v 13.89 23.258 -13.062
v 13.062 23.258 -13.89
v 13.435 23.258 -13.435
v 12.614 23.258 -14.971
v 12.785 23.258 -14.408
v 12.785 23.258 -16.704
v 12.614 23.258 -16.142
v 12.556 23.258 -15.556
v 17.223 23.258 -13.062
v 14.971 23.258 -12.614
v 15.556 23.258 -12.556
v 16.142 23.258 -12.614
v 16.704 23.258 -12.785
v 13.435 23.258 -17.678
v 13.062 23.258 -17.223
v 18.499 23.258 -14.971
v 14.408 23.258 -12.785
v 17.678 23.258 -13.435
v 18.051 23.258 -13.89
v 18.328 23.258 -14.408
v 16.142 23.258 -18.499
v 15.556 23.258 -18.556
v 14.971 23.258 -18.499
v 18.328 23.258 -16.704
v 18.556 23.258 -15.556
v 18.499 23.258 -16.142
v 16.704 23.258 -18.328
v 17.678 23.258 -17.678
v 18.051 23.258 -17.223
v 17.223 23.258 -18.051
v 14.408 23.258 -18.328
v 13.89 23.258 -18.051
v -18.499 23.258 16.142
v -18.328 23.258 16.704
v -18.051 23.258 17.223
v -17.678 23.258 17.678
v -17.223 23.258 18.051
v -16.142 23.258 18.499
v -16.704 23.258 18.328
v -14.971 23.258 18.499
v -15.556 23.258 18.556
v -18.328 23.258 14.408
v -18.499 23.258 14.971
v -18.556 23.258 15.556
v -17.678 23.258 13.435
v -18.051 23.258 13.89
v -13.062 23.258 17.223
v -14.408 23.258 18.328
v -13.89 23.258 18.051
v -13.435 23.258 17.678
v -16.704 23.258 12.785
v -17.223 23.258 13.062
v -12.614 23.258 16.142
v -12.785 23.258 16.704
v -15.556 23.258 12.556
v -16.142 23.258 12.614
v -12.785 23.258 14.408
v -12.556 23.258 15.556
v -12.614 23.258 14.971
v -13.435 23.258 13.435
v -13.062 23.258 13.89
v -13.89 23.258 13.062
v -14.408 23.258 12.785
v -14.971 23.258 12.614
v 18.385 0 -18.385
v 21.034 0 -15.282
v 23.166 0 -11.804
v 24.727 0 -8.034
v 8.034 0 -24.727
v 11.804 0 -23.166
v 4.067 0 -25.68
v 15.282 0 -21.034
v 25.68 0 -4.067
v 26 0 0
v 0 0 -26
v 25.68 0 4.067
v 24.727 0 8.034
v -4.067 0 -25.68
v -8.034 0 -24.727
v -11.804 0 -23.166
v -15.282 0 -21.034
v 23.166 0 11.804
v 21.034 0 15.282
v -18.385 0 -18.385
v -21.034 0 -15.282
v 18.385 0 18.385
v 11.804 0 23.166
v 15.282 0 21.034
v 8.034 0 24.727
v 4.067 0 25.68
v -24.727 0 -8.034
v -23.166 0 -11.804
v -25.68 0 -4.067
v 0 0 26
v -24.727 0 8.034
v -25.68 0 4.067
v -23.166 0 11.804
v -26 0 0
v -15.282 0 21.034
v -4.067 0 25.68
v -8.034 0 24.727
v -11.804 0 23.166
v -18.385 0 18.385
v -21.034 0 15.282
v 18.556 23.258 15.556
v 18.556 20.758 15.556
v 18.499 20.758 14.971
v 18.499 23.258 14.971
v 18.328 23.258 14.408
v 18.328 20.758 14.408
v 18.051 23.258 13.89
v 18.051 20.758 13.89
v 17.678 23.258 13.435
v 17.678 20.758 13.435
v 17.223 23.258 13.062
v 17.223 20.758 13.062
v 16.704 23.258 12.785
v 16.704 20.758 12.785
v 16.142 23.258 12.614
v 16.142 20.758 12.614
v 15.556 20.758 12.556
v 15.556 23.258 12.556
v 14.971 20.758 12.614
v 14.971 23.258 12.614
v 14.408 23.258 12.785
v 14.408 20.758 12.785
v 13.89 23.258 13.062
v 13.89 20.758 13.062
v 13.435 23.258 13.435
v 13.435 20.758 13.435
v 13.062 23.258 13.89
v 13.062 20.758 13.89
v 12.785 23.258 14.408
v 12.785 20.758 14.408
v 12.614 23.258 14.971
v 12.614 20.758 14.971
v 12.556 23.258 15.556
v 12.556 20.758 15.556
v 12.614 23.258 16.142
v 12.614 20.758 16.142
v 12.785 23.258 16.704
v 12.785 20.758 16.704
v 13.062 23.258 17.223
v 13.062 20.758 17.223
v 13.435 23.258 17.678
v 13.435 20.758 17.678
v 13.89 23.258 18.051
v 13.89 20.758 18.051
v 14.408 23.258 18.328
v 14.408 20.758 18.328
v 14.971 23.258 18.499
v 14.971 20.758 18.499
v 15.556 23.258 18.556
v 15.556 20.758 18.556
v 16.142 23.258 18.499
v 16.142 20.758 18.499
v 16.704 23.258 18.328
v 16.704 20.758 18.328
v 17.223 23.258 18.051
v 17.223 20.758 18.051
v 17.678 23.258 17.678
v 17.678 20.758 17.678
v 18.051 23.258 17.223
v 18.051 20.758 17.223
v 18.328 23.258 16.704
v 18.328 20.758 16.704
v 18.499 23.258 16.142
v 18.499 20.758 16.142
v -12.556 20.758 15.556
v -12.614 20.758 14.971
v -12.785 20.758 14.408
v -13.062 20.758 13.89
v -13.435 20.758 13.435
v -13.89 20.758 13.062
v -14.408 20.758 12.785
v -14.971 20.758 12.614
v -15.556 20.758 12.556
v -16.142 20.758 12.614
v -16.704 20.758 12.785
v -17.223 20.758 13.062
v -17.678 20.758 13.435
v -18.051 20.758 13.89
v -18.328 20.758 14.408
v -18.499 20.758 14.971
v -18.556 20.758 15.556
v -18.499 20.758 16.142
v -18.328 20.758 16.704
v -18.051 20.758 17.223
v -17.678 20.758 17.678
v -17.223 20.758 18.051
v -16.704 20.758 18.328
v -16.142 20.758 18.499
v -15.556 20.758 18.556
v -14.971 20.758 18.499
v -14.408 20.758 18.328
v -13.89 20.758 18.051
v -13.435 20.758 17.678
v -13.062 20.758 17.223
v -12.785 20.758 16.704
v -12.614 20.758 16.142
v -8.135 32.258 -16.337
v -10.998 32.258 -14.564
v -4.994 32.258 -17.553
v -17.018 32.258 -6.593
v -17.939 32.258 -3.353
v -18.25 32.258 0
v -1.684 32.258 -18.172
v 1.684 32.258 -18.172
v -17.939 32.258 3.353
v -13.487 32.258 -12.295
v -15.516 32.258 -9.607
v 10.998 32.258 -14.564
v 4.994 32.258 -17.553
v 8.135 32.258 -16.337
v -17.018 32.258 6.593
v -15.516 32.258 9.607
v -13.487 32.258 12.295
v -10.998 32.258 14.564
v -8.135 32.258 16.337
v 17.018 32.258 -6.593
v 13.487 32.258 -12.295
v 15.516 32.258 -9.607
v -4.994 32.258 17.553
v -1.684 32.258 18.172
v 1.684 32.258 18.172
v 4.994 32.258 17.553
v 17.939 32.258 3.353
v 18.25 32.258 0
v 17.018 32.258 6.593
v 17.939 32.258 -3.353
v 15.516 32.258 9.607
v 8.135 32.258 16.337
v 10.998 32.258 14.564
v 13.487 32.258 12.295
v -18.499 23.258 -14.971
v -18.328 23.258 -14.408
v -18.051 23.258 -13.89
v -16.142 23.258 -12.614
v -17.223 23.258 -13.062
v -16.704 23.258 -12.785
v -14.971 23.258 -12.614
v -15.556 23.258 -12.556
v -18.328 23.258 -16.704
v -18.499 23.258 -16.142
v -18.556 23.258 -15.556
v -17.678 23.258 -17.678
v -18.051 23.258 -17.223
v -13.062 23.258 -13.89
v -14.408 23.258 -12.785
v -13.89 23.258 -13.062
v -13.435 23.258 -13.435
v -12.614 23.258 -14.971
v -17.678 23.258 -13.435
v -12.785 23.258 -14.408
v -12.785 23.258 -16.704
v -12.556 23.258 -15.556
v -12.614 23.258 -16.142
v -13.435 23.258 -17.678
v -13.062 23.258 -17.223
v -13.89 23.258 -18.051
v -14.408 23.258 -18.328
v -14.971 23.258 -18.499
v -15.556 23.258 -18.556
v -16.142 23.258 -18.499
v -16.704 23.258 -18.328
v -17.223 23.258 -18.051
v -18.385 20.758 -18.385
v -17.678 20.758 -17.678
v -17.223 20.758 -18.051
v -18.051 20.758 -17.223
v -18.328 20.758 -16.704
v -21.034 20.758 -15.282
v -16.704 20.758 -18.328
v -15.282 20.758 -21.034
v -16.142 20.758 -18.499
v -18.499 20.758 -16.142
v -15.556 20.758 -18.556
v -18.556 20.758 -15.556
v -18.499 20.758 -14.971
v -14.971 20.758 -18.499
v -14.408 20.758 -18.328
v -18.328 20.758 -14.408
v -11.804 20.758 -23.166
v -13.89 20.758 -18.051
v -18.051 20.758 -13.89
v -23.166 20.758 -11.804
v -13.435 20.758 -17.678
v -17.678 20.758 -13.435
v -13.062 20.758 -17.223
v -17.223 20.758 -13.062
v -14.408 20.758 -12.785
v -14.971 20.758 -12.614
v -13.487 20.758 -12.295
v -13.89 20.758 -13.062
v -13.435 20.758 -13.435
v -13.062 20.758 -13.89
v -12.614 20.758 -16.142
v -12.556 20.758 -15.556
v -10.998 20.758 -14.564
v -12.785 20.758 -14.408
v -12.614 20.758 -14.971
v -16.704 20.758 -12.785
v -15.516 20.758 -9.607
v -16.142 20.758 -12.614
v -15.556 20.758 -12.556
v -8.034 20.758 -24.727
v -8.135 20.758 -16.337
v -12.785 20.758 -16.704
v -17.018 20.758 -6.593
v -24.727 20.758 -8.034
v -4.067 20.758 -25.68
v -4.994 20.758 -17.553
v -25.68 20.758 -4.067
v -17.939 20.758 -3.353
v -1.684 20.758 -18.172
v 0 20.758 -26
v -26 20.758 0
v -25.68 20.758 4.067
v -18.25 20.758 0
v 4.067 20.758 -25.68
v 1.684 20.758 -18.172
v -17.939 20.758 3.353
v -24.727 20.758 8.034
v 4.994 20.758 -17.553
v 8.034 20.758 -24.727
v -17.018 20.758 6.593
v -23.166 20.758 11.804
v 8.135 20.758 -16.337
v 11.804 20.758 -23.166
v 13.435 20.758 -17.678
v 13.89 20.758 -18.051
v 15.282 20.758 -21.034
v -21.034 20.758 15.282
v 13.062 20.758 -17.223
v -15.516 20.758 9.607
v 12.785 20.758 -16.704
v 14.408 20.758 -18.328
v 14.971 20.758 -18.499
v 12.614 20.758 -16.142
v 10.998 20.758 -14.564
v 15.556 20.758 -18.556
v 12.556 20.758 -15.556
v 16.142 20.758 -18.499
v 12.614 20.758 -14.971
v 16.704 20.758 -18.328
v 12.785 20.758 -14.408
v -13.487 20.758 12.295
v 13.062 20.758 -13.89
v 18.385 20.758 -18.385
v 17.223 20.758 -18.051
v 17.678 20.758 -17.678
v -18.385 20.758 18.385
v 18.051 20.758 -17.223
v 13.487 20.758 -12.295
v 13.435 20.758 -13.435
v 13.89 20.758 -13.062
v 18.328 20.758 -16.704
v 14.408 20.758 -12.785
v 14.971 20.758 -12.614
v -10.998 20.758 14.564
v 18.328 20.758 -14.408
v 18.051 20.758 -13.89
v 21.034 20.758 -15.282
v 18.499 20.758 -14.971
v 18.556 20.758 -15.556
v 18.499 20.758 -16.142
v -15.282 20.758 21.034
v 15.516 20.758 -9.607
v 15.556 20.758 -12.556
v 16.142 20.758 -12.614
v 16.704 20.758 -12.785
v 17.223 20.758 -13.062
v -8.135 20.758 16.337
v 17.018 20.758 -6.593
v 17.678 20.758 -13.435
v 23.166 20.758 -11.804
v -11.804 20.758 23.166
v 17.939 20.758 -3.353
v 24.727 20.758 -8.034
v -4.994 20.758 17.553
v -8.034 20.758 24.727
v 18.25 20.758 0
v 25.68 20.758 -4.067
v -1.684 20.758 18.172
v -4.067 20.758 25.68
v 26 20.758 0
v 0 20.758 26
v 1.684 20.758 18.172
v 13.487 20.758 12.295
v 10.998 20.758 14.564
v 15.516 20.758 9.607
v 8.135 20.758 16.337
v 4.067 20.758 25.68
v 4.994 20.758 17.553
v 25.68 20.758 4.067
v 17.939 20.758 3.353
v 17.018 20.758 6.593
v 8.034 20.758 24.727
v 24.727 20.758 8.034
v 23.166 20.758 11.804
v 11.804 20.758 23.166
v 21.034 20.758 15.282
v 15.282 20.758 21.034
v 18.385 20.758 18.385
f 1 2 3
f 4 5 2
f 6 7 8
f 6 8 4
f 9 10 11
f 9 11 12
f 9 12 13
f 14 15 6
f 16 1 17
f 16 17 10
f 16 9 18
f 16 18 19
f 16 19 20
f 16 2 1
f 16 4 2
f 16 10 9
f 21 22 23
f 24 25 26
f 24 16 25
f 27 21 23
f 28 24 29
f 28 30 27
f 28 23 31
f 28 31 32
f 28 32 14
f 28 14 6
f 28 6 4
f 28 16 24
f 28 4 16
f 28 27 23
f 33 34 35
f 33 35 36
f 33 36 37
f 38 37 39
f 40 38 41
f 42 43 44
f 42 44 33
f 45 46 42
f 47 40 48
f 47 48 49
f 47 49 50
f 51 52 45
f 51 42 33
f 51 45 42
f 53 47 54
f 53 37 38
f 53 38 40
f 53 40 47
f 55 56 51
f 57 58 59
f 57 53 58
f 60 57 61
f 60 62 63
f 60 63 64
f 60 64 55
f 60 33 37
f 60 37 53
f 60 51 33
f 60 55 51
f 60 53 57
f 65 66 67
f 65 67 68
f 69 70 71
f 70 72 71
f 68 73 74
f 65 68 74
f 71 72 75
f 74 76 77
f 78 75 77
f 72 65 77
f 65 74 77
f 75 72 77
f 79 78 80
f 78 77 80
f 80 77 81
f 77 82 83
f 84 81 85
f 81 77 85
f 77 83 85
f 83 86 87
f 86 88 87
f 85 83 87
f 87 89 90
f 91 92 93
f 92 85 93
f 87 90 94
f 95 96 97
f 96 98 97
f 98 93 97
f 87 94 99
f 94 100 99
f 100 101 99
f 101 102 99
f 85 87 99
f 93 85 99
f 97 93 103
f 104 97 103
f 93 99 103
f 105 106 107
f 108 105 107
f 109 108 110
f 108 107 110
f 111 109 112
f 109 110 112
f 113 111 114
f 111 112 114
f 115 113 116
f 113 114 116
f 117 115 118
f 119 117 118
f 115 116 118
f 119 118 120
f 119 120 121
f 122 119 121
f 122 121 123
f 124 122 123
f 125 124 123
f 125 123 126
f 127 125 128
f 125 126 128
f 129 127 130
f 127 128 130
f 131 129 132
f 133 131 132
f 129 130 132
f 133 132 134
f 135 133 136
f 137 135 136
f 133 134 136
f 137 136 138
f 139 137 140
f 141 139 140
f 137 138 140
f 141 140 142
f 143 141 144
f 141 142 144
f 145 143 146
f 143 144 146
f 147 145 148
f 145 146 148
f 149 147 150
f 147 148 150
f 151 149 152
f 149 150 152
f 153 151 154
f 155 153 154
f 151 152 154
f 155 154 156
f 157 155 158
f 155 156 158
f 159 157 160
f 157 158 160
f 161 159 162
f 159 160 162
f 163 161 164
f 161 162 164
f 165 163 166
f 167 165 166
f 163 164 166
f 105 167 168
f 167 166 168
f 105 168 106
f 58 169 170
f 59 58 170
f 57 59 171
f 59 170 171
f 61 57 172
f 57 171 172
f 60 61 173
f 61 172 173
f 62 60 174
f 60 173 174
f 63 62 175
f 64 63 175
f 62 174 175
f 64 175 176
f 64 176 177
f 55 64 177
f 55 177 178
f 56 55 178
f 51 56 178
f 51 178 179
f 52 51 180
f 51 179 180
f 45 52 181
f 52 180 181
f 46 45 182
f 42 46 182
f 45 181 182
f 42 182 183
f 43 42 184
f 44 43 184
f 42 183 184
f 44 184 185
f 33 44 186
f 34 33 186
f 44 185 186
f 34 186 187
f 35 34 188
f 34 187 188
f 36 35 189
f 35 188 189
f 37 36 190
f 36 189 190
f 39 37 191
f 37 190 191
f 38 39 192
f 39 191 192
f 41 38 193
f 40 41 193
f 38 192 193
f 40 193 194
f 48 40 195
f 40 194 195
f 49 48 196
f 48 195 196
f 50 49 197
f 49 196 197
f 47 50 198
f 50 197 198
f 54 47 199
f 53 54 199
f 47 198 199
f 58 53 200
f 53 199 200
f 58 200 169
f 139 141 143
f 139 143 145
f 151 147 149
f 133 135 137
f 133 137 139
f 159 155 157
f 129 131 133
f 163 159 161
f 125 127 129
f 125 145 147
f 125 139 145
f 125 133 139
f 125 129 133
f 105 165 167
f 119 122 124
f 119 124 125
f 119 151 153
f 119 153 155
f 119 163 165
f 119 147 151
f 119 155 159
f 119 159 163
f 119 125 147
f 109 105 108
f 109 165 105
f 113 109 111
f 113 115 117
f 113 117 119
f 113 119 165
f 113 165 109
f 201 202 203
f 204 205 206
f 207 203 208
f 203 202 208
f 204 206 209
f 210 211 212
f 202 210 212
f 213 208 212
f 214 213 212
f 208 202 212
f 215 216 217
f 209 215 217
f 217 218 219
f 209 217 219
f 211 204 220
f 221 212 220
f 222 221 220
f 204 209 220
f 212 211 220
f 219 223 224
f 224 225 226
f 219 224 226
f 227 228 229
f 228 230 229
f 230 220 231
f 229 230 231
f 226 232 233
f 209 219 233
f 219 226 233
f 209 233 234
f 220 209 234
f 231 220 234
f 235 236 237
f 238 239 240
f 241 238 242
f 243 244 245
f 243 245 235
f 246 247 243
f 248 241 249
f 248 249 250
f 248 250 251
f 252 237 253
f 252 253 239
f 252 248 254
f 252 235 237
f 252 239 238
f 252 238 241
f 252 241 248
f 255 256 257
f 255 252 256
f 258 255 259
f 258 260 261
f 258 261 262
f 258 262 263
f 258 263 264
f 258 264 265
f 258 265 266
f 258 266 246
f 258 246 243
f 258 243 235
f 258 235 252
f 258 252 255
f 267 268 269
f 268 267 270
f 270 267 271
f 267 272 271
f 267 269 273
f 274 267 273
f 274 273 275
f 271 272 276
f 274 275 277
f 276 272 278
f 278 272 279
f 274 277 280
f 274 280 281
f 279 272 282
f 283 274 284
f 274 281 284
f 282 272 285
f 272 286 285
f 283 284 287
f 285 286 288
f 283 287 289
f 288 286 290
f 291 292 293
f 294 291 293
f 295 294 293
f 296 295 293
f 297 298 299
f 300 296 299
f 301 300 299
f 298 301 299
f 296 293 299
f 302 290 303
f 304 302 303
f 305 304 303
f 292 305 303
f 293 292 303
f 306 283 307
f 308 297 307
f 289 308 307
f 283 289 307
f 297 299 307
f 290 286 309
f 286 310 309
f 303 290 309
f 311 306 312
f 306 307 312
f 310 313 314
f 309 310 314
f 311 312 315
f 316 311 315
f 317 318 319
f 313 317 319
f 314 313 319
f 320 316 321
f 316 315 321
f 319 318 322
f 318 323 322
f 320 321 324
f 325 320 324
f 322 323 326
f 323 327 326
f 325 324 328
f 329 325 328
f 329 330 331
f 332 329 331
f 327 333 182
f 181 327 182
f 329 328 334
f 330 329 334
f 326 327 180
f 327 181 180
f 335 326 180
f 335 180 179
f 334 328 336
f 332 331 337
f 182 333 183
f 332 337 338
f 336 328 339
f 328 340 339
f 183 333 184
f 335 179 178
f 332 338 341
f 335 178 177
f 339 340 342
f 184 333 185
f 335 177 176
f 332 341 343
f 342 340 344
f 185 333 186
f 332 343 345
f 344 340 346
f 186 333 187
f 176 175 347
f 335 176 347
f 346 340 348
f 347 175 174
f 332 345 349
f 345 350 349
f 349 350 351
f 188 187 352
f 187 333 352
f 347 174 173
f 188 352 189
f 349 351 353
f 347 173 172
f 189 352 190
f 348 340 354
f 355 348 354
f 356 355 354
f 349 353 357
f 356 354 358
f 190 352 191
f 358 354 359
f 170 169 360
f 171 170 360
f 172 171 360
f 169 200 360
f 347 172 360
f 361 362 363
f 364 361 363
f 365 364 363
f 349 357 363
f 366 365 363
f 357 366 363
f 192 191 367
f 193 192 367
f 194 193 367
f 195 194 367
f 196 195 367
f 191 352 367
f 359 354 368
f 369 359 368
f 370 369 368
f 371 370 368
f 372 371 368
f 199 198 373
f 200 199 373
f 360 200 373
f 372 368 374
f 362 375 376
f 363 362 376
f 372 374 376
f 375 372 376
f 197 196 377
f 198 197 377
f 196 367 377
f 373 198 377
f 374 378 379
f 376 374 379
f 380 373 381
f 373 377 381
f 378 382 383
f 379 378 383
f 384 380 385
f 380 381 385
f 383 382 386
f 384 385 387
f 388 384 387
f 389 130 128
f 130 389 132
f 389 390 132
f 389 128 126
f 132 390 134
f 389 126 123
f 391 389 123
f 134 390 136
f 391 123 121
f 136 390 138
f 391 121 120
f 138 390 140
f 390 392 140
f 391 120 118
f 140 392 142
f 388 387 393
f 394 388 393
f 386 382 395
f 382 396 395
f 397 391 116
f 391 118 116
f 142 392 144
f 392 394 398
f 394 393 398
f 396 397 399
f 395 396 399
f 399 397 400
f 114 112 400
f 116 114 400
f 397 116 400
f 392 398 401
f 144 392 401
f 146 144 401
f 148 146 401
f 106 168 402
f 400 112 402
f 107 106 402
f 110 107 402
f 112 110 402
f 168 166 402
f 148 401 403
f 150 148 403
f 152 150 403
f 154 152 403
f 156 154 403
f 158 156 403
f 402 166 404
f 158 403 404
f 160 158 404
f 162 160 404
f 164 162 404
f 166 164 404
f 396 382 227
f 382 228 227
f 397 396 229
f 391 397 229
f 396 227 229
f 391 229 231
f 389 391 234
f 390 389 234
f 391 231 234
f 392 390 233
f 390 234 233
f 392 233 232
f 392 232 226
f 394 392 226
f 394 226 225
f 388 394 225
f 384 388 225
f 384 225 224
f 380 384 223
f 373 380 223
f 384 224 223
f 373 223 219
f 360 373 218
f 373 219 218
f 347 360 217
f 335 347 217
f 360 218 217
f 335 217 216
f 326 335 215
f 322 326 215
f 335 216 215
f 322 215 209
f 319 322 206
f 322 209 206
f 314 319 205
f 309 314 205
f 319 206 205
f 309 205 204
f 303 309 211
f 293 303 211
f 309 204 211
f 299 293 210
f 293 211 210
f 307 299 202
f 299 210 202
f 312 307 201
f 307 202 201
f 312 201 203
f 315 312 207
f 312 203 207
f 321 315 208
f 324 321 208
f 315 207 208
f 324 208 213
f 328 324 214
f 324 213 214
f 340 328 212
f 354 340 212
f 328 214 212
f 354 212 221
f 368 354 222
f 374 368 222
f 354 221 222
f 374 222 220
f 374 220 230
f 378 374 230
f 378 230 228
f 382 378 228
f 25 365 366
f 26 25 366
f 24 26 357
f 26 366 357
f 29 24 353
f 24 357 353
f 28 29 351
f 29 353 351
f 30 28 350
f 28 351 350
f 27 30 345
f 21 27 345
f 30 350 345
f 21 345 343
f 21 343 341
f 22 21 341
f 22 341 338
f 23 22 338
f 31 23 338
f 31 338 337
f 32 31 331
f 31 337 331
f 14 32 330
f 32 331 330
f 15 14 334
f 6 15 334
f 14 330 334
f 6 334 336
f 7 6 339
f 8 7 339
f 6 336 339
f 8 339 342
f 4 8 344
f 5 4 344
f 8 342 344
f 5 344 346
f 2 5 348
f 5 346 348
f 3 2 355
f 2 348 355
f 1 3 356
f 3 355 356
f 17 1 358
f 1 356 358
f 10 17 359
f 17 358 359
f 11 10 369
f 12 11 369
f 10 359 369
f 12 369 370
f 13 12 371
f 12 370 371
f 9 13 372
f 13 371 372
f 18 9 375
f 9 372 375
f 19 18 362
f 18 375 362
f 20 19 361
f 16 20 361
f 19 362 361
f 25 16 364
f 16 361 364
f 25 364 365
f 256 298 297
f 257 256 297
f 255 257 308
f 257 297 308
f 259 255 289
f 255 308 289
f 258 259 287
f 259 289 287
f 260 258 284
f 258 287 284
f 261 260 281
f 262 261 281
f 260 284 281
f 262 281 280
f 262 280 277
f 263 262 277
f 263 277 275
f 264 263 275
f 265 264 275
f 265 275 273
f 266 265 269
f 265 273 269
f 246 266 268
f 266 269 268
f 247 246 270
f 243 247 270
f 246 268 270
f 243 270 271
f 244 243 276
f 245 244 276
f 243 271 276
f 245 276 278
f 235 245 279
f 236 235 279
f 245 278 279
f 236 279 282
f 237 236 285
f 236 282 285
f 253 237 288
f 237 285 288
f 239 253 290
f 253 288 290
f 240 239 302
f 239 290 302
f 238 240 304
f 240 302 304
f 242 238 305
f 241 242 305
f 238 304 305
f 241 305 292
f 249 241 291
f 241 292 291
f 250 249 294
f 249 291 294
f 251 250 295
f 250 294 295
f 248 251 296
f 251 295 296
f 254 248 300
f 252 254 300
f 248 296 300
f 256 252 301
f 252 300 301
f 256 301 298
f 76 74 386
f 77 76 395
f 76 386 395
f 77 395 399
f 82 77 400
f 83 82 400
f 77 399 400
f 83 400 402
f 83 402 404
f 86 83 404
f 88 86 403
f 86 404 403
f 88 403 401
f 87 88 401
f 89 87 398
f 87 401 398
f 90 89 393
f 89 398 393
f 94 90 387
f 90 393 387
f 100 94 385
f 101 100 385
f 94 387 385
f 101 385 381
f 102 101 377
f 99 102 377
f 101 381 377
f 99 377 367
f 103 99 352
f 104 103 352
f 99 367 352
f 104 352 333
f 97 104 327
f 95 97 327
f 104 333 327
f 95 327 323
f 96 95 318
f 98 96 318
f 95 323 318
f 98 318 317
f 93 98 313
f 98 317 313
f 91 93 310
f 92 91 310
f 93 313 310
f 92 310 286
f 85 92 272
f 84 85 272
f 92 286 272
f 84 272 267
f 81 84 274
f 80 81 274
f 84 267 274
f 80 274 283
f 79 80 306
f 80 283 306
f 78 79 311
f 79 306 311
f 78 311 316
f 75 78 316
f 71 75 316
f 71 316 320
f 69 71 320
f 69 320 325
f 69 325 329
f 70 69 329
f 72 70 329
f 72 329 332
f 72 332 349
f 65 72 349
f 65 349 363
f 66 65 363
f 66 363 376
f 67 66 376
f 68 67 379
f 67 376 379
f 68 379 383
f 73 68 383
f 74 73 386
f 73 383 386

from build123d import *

# Parameters (mm, degrees)
SKETCH4_R           = 3
BOSS_EXTRUDE1_DEPTH = 2.5


with BuildPart() as part:
    # Sketch3 → Revolve1 (revolve)
    with BuildSketch(Plane.XY):
        Polygon((0, 0), (26, 0), (26, 20.758), (18.25, 20.758), (18.25, 32.258), (0, 32.258), align=None)
    revolve(axis=Axis((0, 32.258, 0), (0, -1, 0)))

    # Sketch4 → Boss-Extrude1 (add)
    with BuildSketch(Plane(origin=(0, 20.758, 0), x_dir=(1, 0, 0), z_dir=(0, 1, 0))):
        with Locations((-15.556349186, 15.556349186)):
            Circle(SKETCH4_R)
        with Locations((15.556349186, 15.556349186)):
            Circle(SKETCH4_R)
        with Locations((15.556349186, -15.556349186)):
            Circle(SKETCH4_R)
        with Locations((-15.556349186, -15.556349186)):
            Circle(SKETCH4_R)
    extrude(amount=BOSS_EXTRUDE1_DEPTH)


solid = part.part
